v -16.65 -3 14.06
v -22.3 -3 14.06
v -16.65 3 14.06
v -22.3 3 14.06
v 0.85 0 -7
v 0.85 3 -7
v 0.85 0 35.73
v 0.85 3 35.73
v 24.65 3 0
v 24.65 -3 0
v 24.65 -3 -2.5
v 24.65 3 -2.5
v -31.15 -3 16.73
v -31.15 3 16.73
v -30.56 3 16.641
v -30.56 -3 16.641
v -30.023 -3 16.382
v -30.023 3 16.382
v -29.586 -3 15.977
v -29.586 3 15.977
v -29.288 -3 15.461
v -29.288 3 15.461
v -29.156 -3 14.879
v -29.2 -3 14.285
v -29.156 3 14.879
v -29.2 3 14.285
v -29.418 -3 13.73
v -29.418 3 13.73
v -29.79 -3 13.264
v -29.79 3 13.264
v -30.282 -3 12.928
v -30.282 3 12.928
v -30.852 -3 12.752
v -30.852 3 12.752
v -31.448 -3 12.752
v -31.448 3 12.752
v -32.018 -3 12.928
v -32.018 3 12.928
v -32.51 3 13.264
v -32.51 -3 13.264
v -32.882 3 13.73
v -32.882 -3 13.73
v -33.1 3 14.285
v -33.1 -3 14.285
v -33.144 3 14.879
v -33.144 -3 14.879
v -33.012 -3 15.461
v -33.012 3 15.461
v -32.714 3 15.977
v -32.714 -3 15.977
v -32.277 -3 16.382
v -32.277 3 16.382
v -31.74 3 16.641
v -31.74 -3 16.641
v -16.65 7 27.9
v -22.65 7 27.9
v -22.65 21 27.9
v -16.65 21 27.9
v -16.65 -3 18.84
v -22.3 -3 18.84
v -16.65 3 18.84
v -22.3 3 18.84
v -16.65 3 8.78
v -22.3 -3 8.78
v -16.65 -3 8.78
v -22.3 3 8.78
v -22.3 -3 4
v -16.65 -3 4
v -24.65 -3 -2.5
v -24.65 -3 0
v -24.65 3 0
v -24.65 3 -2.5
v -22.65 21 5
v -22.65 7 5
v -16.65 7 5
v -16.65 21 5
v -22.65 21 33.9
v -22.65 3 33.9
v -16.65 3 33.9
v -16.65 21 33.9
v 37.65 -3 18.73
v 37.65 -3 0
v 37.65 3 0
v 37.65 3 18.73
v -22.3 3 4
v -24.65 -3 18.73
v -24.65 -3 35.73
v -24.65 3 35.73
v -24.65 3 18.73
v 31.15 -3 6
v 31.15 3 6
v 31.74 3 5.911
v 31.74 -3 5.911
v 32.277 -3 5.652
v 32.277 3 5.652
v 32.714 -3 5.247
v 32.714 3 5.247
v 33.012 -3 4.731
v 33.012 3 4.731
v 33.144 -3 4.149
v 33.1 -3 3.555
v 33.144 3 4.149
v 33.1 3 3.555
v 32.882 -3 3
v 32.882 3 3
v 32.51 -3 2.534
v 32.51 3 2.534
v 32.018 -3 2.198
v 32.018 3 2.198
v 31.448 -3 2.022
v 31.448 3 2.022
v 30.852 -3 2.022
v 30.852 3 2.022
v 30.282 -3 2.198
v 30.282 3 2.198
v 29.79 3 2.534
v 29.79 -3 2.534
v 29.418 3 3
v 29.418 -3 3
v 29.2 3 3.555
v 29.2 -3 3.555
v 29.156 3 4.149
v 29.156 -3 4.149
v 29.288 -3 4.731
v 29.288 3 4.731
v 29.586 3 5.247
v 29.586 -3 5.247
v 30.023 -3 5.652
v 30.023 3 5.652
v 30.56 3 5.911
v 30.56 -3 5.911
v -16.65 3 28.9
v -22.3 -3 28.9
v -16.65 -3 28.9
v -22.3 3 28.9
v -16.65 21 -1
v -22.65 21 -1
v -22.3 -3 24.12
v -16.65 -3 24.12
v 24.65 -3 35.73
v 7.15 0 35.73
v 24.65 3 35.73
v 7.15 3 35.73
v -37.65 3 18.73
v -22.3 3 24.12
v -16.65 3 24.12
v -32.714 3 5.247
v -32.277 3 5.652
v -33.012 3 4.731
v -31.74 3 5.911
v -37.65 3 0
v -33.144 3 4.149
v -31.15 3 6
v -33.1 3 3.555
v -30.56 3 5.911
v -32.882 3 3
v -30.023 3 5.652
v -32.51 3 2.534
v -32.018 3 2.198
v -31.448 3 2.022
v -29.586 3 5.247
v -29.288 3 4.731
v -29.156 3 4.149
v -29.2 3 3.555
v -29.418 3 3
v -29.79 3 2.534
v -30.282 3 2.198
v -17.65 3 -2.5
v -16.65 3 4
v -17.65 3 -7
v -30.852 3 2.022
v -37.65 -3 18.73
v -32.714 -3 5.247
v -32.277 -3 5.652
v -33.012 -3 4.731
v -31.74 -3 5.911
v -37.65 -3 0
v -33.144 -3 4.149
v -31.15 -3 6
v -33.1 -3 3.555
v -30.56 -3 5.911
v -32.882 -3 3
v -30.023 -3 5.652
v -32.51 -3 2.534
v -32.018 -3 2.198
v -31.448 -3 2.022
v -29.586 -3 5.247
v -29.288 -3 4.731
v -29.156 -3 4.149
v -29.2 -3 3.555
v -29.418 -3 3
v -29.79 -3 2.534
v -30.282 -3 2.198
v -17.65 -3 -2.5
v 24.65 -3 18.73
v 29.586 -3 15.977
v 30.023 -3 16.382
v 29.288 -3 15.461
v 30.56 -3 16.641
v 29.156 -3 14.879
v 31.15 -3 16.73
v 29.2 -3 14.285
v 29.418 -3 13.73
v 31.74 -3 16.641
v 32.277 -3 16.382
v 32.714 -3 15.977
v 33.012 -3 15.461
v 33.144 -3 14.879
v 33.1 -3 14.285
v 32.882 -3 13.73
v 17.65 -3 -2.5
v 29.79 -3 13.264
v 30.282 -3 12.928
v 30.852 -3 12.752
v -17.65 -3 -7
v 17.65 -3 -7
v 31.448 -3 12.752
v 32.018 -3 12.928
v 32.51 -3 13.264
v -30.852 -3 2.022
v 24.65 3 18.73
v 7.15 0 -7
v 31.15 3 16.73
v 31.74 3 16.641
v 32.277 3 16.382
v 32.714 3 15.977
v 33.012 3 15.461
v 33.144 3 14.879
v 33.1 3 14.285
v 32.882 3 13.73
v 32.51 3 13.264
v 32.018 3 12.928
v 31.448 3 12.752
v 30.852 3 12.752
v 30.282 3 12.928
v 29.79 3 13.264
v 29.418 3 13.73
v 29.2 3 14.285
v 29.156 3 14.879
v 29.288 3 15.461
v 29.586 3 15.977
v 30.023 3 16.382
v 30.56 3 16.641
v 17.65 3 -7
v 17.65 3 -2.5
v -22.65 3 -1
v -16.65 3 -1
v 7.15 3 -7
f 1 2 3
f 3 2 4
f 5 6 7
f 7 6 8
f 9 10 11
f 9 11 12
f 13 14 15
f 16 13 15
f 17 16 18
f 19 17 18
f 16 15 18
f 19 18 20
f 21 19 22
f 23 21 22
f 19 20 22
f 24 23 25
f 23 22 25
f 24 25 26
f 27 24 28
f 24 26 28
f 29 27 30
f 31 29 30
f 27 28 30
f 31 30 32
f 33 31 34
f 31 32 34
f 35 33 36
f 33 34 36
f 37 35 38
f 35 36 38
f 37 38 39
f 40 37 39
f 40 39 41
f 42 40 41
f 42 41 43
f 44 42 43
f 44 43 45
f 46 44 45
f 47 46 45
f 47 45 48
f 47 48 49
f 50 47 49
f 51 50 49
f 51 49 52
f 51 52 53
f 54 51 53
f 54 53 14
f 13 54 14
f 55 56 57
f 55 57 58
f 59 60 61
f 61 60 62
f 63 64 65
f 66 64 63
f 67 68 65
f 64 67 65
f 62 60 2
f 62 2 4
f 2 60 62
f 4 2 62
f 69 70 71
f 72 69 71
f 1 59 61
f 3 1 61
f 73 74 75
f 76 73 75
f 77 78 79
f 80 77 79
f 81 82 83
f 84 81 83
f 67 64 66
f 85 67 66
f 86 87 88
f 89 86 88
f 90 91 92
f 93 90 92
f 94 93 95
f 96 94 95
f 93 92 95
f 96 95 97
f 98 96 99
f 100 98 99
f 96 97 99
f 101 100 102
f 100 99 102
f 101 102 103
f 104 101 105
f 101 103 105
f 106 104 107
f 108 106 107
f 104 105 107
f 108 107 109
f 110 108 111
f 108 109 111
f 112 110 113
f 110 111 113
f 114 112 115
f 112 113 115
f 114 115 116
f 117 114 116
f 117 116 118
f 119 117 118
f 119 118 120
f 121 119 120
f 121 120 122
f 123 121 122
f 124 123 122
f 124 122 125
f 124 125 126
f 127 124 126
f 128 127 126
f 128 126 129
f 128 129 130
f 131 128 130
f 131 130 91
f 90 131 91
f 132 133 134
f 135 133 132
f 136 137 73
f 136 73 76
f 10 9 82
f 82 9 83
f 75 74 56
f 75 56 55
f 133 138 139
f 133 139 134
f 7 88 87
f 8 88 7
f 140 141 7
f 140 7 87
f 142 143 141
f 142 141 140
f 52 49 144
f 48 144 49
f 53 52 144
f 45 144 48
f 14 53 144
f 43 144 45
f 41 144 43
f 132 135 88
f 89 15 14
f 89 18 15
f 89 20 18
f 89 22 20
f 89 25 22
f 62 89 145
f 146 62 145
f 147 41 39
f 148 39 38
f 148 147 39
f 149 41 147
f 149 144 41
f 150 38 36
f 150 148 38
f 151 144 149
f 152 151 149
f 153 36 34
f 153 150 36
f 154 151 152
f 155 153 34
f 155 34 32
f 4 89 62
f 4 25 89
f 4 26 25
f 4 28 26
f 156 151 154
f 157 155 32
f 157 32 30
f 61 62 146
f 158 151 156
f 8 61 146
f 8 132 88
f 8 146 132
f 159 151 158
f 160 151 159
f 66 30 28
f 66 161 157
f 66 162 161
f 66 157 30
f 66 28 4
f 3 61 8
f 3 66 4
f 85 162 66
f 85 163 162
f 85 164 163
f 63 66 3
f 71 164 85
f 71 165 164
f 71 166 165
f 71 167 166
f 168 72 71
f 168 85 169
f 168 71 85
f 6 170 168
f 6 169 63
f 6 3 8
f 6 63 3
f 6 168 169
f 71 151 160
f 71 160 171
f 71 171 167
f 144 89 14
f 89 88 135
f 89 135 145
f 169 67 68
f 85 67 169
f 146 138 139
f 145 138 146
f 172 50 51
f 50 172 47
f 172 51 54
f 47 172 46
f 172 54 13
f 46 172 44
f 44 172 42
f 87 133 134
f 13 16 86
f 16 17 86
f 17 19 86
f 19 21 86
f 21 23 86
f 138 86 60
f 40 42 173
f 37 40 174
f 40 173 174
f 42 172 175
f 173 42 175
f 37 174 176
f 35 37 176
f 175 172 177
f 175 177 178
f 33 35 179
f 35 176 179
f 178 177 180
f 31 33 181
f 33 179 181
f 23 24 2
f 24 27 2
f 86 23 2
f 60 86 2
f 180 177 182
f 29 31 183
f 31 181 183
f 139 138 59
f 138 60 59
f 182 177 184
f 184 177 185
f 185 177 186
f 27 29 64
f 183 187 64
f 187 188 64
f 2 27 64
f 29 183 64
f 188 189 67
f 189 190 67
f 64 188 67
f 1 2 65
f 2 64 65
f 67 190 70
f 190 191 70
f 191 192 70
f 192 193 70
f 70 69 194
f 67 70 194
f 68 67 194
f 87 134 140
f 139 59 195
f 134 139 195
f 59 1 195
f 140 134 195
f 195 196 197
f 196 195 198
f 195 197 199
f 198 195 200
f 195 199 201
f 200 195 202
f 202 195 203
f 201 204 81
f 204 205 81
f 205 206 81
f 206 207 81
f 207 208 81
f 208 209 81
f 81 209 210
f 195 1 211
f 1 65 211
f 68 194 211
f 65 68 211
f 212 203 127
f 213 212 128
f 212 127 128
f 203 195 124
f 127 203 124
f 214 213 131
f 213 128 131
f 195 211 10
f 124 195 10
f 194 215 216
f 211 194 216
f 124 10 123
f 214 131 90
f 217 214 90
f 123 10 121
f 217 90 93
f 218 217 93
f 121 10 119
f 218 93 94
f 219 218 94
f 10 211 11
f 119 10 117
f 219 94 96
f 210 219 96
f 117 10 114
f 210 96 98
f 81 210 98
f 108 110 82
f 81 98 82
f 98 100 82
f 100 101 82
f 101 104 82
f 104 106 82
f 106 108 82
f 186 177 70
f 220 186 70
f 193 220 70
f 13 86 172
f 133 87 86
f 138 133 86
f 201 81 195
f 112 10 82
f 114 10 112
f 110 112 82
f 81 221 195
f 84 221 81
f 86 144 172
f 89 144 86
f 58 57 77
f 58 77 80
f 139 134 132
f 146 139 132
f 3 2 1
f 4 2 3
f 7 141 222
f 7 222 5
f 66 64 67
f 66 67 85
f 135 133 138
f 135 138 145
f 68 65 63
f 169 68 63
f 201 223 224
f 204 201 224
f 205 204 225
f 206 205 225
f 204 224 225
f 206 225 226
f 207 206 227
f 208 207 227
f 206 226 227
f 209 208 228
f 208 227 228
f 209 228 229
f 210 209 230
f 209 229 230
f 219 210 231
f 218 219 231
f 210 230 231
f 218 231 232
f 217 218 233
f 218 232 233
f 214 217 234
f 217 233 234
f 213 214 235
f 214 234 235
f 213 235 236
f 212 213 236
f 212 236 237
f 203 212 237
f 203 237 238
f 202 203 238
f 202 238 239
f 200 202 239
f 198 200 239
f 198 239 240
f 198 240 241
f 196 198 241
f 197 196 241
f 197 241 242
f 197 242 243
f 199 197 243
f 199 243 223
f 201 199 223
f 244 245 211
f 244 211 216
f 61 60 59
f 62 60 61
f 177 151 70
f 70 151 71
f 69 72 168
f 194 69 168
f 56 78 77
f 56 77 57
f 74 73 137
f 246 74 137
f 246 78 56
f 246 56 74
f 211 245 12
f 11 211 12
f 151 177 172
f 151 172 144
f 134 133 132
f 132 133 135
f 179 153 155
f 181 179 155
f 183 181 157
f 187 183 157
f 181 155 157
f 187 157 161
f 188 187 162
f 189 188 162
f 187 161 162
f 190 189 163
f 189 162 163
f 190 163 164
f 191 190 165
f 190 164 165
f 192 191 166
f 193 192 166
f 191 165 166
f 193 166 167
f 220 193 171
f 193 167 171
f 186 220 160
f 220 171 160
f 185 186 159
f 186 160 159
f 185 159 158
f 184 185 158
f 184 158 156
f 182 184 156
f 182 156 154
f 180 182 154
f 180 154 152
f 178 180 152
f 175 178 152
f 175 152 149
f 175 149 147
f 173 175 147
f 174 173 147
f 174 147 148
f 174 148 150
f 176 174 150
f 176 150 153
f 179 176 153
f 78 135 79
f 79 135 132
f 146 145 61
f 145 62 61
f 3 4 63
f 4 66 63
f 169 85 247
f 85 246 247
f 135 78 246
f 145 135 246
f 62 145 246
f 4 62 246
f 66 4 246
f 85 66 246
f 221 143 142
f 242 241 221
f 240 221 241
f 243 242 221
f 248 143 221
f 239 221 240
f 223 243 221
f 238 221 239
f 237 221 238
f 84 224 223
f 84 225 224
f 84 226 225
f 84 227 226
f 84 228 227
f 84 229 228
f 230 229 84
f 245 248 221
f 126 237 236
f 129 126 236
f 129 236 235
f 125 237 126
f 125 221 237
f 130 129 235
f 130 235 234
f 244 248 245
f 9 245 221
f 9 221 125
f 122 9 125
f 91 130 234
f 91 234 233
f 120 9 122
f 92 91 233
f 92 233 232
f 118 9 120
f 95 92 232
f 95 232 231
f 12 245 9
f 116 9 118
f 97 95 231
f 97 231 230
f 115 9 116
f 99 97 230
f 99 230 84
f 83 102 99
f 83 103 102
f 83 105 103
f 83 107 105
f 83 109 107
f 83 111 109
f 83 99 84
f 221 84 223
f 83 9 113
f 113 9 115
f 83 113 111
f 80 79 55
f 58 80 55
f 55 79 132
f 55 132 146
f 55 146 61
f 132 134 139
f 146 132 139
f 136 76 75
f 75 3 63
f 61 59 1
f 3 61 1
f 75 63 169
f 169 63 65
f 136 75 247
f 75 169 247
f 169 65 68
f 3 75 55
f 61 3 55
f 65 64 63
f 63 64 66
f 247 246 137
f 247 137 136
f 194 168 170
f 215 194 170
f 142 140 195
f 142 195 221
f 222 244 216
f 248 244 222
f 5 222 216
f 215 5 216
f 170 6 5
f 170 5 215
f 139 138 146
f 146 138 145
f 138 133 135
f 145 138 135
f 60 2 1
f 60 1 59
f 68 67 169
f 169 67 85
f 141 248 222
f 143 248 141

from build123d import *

# Parameters (mm, degrees)
SKETCH_2_W          = 75.3
SKETCH_2_H          = 6
EXTRUDE_1_DEPTH     = 18.73
SKETCH_3_R          = 2
CUT_EXTRUDE_1_DEPTH = 13.73
SKETCH_4_W          = 49.3
SKETCH_4_H          = 6
EXTRUDE_3_DEPTH     = 17
SKETCH_6_W          = 49.3
SKETCH_6_H          = 6
EXTRUDE_5_DEPTH     = 7
SKETCH_7_W          = 6
SKETCH_7_H          = 6
EXTRUDE_6_DEPTH     = 18
SKETCH_8_W          = 6.3
SKETCH_8_H          = 42.73
CUT_EXTRUDE_2_DEPTH = 3
SKETCH_9_W          = 7
SKETCH_9_H          = 4.5
CUT_EXTRUDE_3_DEPTH = 10
SKETCH_10_W         = 6
SKETCH_10_H         = 22.9
EXTRUDE_7_DEPTH     = 4
OTHER_START         = -22.3
OTHER_1_OUTLINE_W   = 6
OTHER_1_OUTLINE_H   = 4.78
OTHER_1_DEPTH       = 5.65
OTHER_1_2_OUTLINE_W = 6
OTHER_1_2_OUTLINE_H = 4.78
OTHER_1_2_DEPTH     = 5.65


# Read off the part's stored shape, not the designer's step: Разделить1, Выступы и прорези-Выступ1, Выступы и прорези-Прорезь1
with BuildPart() as part:
    # Эскиз2 → Бобышка-Вытянуть1 (new body)
    with BuildSketch(Plane.XY):
        Rectangle(SKETCH_2_W, SKETCH_2_H)
    extrude(amount=EXTRUDE_1_DEPTH)

    # Эскиз3 → Вырез-Вытянуть1 (cut)
    with BuildSketch(Plane(origin=(0, 3, 0), x_dir=(1, 0, 0), z_dir=(0, 1, 0))):
        with Locations(Location((-31.15, -4, 0), (0, 0, 270))):
            Circle(SKETCH_3_R)
        with Locations(Location((-31.15, -14.73, 0), (0, 0, 270))):
            Circle(SKETCH_3_R)
        with Locations(Location((31.15, -14.73, 0), (0, 0, 270))):
            Circle(SKETCH_3_R)
        with Locations(Location((31.15, -4, 0), (0, 0, 270))):
            Circle(SKETCH_3_R)
    extrude(amount=-CUT_EXTRUDE_1_DEPTH, mode=Mode.SUBTRACT)

    # Эскиз4 → Бобышка-Вытянуть3 (add)
    with BuildSketch(Plane.XY.offset(18.73)):
        Rectangle(SKETCH_4_W, SKETCH_4_H)
    extrude(amount=EXTRUDE_3_DEPTH)

    # Эскиз6 → Бобышка-Вытянуть5 (add)
    with BuildSketch(Plane(origin=(0, 0, 0), x_dir=(-1, 0, 0), z_dir=(0, 0, -1))):
        Rectangle(SKETCH_6_W, SKETCH_6_H)
    extrude(amount=EXTRUDE_5_DEPTH)

    # Эскиз7 → Бобышка-Вытянуть6 (add)
    with BuildSketch(Plane(origin=(0, 3, 0), x_dir=(1, 0, 0), z_dir=(0, 1, 0))):
        with Locations((-19.65, -2)):
            Rectangle(SKETCH_7_W, SKETCH_7_H)
        with Locations((-19.65, -30.9)):
            Rectangle(SKETCH_7_W, SKETCH_7_H)
    extrude(amount=EXTRUDE_6_DEPTH)

    # Эскиз8 → Вырез-Вытянуть2 (cut)
    with BuildSketch(Plane(origin=(0, 3, -43.99), x_dir=(-1, 0, 0), z_dir=(0, 1, 0))):
        with Locations((-4, 58.355)):
            Rectangle(SKETCH_8_W, SKETCH_8_H)
    extrude(amount=-CUT_EXTRUDE_2_DEPTH, mode=Mode.SUBTRACT)

    # Эскиз9 → Вырез-Вытянуть3 (cut)
    with BuildSketch(Plane(origin=(0, 3, 0), x_dir=(1, 0, 0), z_dir=(0, 1, 0))):
        with Locations((-21.15, 4.75)):
            Rectangle(SKETCH_9_W, SKETCH_9_H)
        with Locations((21.15, 4.75)):
            Rectangle(SKETCH_9_W, SKETCH_9_H)
    extrude(amount=-CUT_EXTRUDE_3_DEPTH, mode=Mode.SUBTRACT)

    # Эскиз10 → Бобышка-Вытянуть7 (add)
    with BuildSketch(Plane(origin=(0, 3, 0), x_dir=(1, 0, 0), z_dir=(0, 1, 0))):
        with Locations((-19.65, -16.45)):
            Rectangle(SKETCH_10_W, SKETCH_10_H)
    extrude(amount=EXTRUDE_7_DEPTH)


with BuildPart() as body_2:
    # Split Bodies 1: the piece on the far side of the plane
    add(part.part)
    split(bisect_by=Plane(origin=(0, 3, 0), x_dir=(1, 0, 0), z_dir=(0, 1, 0)), keep=Keep.BOTTOM)

    # Other 1 2 outline → Other 1 2 (cut)
    with BuildSketch(Plane.YZ.offset(OTHER_START)):
        with Locations((0, 26.51)):
            Rectangle(OTHER_1_2_OUTLINE_W, OTHER_1_2_OUTLINE_H)
        with Locations((0, 16.45)):
            Rectangle(OTHER_1_2_OUTLINE_W, OTHER_1_2_OUTLINE_H)
        with Locations((0, 6.39)):
            Rectangle(OTHER_1_2_OUTLINE_W, OTHER_1_2_OUTLINE_H)
    extrude(amount=OTHER_1_2_DEPTH, mode=Mode.SUBTRACT)


with BuildPart() as part_1:
    add(part.part)

    # Split Bodies 1
    split(bisect_by=Plane(origin=(0, 3, 0), x_dir=(1, 0, 0), z_dir=(0, 1, 0)), keep=Keep.TOP)

    # Other 1 outline → Other 1 (add)
    with BuildSketch(Plane.YZ.offset(OTHER_START)):
        with Locations((0, 6.39)):
            Rectangle(OTHER_1_OUTLINE_W, OTHER_1_OUTLINE_H)
        with Locations((0, 16.45)):
            Rectangle(OTHER_1_OUTLINE_W, OTHER_1_OUTLINE_H)
        with Locations((0, 26.51)):
            Rectangle(OTHER_1_OUTLINE_W, OTHER_1_OUTLINE_H)
    extrude(amount=OTHER_1_DEPTH)


solid = Compound([body_2.part, part_1.part])
